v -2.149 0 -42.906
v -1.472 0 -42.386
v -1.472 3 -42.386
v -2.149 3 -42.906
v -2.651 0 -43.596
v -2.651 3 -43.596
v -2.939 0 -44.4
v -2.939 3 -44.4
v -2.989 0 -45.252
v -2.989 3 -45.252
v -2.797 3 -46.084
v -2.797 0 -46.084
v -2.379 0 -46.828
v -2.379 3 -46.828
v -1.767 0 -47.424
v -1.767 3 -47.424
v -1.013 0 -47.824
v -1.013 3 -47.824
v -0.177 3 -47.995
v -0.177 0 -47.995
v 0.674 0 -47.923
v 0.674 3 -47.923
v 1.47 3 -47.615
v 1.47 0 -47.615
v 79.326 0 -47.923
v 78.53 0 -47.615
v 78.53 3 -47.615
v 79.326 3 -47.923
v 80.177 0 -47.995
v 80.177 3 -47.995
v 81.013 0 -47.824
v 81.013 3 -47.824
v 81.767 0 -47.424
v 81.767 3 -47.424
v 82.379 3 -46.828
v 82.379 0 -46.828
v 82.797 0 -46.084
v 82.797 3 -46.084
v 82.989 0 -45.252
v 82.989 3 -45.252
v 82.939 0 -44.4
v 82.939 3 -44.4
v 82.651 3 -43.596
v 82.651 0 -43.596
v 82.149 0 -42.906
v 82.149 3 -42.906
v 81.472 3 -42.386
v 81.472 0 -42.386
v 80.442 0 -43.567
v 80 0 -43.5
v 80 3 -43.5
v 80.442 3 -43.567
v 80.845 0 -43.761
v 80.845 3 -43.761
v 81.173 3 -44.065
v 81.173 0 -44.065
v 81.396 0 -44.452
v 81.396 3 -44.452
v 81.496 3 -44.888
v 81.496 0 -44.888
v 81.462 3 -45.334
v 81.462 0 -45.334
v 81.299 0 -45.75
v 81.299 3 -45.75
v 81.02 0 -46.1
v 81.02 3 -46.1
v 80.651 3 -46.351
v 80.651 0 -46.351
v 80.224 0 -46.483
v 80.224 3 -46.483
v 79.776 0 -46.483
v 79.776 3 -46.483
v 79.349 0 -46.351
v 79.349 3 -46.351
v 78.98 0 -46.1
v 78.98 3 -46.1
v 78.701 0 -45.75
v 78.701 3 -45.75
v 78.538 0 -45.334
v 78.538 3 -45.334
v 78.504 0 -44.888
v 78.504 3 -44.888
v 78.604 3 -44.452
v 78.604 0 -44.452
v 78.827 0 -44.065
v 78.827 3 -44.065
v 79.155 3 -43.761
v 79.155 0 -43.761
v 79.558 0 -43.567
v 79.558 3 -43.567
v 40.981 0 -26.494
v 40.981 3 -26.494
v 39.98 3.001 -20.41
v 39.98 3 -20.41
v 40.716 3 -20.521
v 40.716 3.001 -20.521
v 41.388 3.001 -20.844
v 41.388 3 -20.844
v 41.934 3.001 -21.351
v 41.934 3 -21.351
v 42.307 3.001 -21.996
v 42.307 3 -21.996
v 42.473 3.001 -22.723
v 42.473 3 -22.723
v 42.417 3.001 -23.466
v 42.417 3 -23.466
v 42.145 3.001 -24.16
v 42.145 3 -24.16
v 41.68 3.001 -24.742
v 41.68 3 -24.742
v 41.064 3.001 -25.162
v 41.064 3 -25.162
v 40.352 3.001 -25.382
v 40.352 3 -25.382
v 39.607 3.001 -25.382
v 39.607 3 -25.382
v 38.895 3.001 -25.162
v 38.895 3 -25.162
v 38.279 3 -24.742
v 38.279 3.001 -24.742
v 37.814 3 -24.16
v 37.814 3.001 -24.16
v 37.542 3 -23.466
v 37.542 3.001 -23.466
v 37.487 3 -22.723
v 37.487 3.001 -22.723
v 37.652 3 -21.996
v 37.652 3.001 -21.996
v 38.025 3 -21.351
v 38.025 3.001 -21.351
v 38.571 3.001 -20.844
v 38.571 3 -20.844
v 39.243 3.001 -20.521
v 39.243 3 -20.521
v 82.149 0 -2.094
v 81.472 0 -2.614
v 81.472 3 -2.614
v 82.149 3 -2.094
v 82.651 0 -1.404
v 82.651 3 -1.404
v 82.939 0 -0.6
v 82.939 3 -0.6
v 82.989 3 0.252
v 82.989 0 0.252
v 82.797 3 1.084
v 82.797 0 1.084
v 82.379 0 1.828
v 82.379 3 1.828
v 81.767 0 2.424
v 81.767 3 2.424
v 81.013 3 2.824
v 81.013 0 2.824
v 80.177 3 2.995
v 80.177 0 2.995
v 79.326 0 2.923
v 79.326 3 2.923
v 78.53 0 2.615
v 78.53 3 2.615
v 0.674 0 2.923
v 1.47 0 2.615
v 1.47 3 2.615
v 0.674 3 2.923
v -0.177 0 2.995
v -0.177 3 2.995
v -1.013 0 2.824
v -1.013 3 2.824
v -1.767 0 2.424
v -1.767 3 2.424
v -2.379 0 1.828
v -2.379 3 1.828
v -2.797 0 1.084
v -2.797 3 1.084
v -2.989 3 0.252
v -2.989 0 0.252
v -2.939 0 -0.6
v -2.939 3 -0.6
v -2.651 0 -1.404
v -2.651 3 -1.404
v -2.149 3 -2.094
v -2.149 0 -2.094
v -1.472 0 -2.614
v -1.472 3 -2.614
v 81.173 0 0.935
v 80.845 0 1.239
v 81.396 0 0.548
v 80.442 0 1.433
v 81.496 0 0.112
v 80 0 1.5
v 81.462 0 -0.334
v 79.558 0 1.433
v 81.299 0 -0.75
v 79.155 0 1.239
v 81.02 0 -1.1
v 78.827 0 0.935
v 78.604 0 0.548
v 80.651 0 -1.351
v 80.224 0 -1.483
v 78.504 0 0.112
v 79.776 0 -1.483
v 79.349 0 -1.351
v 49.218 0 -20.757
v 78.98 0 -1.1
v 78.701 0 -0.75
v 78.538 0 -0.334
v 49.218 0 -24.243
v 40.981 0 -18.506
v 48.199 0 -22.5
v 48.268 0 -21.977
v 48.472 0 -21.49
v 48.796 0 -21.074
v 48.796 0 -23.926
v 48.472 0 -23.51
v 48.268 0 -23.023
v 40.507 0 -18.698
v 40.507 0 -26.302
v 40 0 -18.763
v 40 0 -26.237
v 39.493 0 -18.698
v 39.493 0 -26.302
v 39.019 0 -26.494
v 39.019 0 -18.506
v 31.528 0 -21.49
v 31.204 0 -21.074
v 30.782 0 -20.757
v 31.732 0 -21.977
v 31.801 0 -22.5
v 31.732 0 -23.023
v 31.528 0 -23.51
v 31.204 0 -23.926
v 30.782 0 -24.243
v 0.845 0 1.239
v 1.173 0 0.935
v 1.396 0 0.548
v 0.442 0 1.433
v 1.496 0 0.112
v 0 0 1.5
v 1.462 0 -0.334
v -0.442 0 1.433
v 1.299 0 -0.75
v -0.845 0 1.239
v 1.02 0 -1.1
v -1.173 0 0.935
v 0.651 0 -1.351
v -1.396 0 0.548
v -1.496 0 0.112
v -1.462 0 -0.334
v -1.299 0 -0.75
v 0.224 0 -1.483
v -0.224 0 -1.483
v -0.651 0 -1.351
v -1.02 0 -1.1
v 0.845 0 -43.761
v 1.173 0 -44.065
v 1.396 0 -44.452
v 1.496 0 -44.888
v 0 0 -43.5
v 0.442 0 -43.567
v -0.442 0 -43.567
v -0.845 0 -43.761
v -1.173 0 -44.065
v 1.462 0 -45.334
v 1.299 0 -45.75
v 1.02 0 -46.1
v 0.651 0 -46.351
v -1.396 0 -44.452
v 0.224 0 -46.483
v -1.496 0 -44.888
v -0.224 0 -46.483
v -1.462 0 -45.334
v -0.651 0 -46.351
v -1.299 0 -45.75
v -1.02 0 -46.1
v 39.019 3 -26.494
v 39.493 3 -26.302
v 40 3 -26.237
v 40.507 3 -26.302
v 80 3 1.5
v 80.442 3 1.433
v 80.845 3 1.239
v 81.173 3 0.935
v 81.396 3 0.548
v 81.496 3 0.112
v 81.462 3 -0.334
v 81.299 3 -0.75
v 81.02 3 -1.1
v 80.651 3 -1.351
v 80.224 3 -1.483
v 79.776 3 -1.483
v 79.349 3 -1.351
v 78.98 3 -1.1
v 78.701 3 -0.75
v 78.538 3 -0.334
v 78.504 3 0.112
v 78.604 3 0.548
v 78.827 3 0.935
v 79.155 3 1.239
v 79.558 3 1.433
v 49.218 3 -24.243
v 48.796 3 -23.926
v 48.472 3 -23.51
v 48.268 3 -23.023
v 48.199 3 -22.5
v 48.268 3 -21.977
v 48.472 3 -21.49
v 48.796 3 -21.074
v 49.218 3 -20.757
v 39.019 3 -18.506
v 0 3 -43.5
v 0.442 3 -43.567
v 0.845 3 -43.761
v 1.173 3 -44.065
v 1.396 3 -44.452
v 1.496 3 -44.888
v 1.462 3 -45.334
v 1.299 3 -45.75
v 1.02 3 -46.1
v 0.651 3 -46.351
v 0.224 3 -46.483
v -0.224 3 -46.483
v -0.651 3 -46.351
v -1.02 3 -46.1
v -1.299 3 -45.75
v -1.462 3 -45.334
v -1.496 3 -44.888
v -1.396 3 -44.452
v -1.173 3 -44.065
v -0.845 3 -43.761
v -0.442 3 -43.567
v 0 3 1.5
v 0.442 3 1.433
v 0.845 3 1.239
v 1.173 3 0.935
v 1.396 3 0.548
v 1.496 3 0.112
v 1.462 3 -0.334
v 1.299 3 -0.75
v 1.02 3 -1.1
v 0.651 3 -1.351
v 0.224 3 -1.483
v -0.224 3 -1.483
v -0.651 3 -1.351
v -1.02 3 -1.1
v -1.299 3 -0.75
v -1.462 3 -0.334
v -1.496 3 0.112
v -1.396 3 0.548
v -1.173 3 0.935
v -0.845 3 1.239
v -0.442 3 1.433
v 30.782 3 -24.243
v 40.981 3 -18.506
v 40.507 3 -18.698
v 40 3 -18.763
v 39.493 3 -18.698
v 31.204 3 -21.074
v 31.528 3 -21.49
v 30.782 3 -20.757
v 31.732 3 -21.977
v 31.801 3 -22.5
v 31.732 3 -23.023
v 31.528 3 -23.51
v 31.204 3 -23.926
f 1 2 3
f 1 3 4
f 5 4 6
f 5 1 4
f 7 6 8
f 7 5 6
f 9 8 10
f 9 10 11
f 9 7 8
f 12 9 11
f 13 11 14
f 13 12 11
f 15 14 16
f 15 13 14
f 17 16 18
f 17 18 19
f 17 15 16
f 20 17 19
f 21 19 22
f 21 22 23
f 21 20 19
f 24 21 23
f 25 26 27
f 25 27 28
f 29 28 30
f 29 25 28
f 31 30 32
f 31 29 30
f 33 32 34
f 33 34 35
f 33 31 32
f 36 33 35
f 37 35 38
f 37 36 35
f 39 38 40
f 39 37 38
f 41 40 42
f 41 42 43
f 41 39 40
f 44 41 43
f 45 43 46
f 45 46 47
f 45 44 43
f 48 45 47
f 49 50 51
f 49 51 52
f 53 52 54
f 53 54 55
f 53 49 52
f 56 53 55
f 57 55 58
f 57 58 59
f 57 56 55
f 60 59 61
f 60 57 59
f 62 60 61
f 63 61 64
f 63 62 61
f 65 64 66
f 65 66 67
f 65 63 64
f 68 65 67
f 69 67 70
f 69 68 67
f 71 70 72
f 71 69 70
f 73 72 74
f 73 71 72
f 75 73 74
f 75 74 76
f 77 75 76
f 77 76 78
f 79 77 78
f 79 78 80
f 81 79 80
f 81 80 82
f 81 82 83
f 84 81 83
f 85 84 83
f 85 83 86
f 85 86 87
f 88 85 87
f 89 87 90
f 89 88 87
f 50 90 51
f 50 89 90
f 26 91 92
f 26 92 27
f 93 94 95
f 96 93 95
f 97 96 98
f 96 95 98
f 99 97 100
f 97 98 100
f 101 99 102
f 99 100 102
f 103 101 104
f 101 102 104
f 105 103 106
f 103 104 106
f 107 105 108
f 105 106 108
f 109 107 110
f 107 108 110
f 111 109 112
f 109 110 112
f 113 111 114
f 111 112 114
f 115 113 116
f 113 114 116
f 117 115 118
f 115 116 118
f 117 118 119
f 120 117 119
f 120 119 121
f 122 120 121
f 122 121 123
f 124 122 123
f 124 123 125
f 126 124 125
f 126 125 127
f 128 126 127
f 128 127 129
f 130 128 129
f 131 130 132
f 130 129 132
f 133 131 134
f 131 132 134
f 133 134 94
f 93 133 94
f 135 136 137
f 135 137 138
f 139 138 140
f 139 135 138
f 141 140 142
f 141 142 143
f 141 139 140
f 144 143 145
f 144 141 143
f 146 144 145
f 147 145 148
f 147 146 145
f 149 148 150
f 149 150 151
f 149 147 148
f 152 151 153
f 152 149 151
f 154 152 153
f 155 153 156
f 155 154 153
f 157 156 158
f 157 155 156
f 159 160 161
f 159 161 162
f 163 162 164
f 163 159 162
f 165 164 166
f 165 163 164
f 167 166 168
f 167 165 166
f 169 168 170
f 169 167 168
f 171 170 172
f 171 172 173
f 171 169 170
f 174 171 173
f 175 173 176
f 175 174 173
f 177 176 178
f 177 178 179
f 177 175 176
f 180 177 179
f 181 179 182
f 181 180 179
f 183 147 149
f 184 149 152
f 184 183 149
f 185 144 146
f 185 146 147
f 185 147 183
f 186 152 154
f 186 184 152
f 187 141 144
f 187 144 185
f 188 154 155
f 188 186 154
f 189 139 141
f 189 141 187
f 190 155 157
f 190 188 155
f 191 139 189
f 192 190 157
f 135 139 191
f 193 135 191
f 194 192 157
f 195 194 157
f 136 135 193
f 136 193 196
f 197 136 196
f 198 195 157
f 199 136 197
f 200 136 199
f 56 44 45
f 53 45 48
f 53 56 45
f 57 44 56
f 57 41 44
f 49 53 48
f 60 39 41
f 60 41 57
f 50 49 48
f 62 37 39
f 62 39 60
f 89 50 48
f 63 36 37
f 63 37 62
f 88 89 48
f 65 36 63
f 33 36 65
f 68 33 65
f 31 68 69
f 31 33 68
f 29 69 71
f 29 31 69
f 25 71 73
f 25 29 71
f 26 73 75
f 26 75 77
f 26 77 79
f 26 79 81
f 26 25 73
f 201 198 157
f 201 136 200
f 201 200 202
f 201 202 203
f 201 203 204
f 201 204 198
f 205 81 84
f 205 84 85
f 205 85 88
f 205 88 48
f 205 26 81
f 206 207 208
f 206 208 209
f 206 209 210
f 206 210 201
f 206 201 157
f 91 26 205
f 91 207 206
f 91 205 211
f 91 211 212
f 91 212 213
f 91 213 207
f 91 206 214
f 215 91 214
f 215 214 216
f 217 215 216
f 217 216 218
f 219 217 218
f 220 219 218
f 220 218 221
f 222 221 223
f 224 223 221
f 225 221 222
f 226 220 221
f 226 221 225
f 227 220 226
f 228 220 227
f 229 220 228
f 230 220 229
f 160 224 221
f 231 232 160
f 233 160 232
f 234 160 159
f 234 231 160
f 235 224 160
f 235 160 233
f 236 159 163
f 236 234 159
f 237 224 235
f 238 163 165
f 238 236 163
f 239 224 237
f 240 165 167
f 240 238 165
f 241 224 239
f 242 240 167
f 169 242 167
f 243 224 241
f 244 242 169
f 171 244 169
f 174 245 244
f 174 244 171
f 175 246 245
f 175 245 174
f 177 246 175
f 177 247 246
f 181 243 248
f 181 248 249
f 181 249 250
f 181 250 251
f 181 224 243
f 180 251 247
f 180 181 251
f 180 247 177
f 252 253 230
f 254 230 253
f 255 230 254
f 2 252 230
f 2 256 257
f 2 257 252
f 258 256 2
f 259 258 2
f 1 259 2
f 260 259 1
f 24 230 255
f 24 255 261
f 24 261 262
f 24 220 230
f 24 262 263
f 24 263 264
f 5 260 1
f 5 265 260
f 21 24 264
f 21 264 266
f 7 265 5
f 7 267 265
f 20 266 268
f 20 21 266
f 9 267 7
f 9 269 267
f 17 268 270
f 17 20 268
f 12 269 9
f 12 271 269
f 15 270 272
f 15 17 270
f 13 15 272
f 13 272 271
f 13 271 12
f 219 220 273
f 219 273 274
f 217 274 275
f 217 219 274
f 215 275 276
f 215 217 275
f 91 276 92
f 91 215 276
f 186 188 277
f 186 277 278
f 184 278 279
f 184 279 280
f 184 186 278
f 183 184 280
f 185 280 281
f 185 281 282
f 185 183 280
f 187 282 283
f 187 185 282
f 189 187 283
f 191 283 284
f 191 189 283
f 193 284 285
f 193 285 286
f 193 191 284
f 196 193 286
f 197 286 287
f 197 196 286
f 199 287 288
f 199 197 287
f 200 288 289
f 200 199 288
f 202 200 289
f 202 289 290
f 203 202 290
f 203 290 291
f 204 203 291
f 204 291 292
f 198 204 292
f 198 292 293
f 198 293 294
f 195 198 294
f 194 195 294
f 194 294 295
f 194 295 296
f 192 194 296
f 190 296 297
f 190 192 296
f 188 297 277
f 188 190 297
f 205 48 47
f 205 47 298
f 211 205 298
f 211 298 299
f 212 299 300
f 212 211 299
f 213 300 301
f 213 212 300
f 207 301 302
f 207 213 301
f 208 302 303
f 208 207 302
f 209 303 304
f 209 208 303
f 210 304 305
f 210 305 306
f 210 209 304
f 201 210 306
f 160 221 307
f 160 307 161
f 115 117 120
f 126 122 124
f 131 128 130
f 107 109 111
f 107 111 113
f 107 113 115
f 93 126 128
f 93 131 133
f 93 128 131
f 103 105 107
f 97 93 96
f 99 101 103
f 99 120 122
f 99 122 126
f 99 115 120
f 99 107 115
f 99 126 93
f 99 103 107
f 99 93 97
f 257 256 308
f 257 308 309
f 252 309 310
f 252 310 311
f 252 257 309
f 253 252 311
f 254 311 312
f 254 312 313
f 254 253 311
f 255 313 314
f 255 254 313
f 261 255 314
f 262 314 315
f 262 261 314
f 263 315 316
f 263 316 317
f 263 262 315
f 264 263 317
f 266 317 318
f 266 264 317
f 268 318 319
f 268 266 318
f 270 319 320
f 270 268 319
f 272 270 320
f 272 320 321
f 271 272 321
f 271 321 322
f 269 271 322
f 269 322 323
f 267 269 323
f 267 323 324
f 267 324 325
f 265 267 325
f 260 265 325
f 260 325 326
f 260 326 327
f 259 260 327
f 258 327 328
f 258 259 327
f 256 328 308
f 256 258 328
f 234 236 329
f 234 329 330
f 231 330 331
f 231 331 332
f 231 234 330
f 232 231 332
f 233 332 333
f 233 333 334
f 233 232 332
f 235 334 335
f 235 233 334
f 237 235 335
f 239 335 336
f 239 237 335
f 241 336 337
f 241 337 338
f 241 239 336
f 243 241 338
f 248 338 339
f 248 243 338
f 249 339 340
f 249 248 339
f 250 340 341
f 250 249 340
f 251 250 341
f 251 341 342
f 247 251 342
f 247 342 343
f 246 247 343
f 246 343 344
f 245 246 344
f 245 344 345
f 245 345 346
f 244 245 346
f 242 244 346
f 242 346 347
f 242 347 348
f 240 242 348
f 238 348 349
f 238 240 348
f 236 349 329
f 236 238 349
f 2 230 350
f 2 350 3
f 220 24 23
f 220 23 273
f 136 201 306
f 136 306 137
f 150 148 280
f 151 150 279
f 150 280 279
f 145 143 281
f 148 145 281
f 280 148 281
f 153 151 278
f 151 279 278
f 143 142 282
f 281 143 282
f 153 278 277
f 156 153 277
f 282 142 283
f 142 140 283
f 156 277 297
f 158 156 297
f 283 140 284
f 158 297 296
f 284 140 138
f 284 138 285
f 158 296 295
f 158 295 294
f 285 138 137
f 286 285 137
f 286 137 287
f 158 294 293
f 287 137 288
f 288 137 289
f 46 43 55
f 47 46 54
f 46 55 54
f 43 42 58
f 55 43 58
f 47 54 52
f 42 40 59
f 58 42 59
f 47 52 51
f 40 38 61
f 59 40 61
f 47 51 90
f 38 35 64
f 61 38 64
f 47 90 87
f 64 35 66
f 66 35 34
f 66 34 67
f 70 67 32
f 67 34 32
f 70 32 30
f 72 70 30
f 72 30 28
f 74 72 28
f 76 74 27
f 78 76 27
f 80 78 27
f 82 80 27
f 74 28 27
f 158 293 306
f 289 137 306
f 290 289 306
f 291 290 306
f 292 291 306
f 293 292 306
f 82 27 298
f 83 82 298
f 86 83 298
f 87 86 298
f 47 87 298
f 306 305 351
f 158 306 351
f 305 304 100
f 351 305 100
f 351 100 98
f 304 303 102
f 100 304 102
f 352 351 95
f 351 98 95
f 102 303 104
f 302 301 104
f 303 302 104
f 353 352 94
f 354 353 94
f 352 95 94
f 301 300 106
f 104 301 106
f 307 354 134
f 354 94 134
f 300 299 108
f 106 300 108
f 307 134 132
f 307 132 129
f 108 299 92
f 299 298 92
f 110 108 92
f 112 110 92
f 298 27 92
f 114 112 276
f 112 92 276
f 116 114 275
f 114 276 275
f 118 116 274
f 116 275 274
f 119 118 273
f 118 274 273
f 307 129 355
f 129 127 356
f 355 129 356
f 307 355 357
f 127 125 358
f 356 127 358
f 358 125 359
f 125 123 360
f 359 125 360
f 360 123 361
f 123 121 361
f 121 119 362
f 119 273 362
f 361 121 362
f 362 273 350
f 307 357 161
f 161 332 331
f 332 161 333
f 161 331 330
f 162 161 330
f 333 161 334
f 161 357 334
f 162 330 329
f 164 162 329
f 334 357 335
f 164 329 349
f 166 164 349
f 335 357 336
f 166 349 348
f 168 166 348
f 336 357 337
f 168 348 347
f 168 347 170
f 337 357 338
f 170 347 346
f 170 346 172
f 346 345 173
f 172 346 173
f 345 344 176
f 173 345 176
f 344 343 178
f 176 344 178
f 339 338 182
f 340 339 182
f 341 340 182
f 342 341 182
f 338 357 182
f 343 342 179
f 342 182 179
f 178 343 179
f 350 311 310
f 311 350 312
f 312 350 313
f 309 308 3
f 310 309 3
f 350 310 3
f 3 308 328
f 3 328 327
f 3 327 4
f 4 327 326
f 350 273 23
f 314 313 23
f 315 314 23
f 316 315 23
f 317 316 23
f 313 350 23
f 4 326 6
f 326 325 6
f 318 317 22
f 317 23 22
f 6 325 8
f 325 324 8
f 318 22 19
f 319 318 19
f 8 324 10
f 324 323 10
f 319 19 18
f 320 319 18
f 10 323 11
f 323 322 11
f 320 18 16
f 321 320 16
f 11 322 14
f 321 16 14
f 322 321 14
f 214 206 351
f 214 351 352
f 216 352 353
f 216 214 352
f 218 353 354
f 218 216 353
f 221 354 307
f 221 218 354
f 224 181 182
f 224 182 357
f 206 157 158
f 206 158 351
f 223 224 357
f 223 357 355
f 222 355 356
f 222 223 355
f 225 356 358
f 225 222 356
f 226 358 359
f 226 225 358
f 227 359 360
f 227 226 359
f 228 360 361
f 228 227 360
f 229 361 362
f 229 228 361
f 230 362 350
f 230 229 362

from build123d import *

# Parameters (mm, degrees)
SKETCH1_R           = 1.5
BOSS_EXTRUDE1_DEPTH = 3
SKETCH2_R           = 2.5
BOSS_EXTRUDE2_DEPTH = 0.001


with BuildPart() as part:
    # Sketch1 → Boss-Extrude1 (new body)
    with BuildSketch(Plane(origin=(0, 0, 0), x_dir=(1, 0, 0), z_dir=(0, 1, 0))):
        with BuildLine():
            Line((1.470120334, 47.615099655), (39.019477518, 26.493586162))
            ThreePointArc((39.019477518, 26.493586162), (40, 26.236737235), (40.980522482, 26.493586162))
            Line((40.980522482, 26.493586162), (78.529879666, 47.615099655))
            ThreePointArc((78.529879666, 47.615099655), (82.614620243, 46.470972803), (81.471825115, 42.385859447))
            Line((81.471825115, 42.385859447), (49.218121455, 24.243151073))
            ThreePointArc((49.218121455, 24.243151073), (48.198643937, 22.5), (49.218121455, 20.756848927))
            Line((49.218121455, 20.756848927), (81.471825115, 2.614140553))
            ThreePointArc((81.471825115, 2.614140553), (82.614620243, -1.470972803), (78.529879666, -2.615099655))
            Line((78.529879666, -2.615099655), (40.980522482, 18.506413838))
            ThreePointArc((40.980522482, 18.506413838), (40, 18.763262765), (39.019477518, 18.506413838))
            Line((39.019477518, 18.506413838), (1.470120334, -2.615099655))
            ThreePointArc((1.470120334, -2.615099655), (-2.614620243, -1.470972803), (-1.471825115, 2.614140553))
            Line((-1.471825115, 2.614140553), (30.781878545, 20.756848927))
            ThreePointArc((30.781878545, 20.756848927), (31.801356063, 22.5), (30.781878545, 24.243151073))
            Line((30.781878545, 24.243151073), (-1.471825115, 42.385859447))
            ThreePointArc((-1.471825115, 42.385859447), (-2.614620243, 46.470972803), (1.470120334, 47.615099655))
        make_face()
        with Locations(Location((0, 45, 0), (0, 0, 270))):
            Circle(SKETCH1_R, mode=Mode.SUBTRACT)
        with Locations(Location((80, 45, 0), (0, 0, 270))):
            Circle(SKETCH1_R, mode=Mode.SUBTRACT)
        with Locations(Location((80, 0, 0), (0, 0, 270))):
            Circle(SKETCH1_R, mode=Mode.SUBTRACT)
        with Locations(Location((0, 0, 0), (0, 0, 270))):
            Circle(SKETCH1_R, mode=Mode.SUBTRACT)
    extrude(amount=BOSS_EXTRUDE1_DEPTH)

    # Sketch2 → Boss-Extrude2 (add)
    with BuildSketch(Plane(origin=(0, 3, 0), x_dir=(1, 0, 0), z_dir=(0, 1, 0))):
        with Locations(Location((39.97951418, 22.909712694, 0), (0, 0, 270))):
            Circle(SKETCH2_R)
    extrude(amount=BOSS_EXTRUDE2_DEPTH)


solid = part.part
